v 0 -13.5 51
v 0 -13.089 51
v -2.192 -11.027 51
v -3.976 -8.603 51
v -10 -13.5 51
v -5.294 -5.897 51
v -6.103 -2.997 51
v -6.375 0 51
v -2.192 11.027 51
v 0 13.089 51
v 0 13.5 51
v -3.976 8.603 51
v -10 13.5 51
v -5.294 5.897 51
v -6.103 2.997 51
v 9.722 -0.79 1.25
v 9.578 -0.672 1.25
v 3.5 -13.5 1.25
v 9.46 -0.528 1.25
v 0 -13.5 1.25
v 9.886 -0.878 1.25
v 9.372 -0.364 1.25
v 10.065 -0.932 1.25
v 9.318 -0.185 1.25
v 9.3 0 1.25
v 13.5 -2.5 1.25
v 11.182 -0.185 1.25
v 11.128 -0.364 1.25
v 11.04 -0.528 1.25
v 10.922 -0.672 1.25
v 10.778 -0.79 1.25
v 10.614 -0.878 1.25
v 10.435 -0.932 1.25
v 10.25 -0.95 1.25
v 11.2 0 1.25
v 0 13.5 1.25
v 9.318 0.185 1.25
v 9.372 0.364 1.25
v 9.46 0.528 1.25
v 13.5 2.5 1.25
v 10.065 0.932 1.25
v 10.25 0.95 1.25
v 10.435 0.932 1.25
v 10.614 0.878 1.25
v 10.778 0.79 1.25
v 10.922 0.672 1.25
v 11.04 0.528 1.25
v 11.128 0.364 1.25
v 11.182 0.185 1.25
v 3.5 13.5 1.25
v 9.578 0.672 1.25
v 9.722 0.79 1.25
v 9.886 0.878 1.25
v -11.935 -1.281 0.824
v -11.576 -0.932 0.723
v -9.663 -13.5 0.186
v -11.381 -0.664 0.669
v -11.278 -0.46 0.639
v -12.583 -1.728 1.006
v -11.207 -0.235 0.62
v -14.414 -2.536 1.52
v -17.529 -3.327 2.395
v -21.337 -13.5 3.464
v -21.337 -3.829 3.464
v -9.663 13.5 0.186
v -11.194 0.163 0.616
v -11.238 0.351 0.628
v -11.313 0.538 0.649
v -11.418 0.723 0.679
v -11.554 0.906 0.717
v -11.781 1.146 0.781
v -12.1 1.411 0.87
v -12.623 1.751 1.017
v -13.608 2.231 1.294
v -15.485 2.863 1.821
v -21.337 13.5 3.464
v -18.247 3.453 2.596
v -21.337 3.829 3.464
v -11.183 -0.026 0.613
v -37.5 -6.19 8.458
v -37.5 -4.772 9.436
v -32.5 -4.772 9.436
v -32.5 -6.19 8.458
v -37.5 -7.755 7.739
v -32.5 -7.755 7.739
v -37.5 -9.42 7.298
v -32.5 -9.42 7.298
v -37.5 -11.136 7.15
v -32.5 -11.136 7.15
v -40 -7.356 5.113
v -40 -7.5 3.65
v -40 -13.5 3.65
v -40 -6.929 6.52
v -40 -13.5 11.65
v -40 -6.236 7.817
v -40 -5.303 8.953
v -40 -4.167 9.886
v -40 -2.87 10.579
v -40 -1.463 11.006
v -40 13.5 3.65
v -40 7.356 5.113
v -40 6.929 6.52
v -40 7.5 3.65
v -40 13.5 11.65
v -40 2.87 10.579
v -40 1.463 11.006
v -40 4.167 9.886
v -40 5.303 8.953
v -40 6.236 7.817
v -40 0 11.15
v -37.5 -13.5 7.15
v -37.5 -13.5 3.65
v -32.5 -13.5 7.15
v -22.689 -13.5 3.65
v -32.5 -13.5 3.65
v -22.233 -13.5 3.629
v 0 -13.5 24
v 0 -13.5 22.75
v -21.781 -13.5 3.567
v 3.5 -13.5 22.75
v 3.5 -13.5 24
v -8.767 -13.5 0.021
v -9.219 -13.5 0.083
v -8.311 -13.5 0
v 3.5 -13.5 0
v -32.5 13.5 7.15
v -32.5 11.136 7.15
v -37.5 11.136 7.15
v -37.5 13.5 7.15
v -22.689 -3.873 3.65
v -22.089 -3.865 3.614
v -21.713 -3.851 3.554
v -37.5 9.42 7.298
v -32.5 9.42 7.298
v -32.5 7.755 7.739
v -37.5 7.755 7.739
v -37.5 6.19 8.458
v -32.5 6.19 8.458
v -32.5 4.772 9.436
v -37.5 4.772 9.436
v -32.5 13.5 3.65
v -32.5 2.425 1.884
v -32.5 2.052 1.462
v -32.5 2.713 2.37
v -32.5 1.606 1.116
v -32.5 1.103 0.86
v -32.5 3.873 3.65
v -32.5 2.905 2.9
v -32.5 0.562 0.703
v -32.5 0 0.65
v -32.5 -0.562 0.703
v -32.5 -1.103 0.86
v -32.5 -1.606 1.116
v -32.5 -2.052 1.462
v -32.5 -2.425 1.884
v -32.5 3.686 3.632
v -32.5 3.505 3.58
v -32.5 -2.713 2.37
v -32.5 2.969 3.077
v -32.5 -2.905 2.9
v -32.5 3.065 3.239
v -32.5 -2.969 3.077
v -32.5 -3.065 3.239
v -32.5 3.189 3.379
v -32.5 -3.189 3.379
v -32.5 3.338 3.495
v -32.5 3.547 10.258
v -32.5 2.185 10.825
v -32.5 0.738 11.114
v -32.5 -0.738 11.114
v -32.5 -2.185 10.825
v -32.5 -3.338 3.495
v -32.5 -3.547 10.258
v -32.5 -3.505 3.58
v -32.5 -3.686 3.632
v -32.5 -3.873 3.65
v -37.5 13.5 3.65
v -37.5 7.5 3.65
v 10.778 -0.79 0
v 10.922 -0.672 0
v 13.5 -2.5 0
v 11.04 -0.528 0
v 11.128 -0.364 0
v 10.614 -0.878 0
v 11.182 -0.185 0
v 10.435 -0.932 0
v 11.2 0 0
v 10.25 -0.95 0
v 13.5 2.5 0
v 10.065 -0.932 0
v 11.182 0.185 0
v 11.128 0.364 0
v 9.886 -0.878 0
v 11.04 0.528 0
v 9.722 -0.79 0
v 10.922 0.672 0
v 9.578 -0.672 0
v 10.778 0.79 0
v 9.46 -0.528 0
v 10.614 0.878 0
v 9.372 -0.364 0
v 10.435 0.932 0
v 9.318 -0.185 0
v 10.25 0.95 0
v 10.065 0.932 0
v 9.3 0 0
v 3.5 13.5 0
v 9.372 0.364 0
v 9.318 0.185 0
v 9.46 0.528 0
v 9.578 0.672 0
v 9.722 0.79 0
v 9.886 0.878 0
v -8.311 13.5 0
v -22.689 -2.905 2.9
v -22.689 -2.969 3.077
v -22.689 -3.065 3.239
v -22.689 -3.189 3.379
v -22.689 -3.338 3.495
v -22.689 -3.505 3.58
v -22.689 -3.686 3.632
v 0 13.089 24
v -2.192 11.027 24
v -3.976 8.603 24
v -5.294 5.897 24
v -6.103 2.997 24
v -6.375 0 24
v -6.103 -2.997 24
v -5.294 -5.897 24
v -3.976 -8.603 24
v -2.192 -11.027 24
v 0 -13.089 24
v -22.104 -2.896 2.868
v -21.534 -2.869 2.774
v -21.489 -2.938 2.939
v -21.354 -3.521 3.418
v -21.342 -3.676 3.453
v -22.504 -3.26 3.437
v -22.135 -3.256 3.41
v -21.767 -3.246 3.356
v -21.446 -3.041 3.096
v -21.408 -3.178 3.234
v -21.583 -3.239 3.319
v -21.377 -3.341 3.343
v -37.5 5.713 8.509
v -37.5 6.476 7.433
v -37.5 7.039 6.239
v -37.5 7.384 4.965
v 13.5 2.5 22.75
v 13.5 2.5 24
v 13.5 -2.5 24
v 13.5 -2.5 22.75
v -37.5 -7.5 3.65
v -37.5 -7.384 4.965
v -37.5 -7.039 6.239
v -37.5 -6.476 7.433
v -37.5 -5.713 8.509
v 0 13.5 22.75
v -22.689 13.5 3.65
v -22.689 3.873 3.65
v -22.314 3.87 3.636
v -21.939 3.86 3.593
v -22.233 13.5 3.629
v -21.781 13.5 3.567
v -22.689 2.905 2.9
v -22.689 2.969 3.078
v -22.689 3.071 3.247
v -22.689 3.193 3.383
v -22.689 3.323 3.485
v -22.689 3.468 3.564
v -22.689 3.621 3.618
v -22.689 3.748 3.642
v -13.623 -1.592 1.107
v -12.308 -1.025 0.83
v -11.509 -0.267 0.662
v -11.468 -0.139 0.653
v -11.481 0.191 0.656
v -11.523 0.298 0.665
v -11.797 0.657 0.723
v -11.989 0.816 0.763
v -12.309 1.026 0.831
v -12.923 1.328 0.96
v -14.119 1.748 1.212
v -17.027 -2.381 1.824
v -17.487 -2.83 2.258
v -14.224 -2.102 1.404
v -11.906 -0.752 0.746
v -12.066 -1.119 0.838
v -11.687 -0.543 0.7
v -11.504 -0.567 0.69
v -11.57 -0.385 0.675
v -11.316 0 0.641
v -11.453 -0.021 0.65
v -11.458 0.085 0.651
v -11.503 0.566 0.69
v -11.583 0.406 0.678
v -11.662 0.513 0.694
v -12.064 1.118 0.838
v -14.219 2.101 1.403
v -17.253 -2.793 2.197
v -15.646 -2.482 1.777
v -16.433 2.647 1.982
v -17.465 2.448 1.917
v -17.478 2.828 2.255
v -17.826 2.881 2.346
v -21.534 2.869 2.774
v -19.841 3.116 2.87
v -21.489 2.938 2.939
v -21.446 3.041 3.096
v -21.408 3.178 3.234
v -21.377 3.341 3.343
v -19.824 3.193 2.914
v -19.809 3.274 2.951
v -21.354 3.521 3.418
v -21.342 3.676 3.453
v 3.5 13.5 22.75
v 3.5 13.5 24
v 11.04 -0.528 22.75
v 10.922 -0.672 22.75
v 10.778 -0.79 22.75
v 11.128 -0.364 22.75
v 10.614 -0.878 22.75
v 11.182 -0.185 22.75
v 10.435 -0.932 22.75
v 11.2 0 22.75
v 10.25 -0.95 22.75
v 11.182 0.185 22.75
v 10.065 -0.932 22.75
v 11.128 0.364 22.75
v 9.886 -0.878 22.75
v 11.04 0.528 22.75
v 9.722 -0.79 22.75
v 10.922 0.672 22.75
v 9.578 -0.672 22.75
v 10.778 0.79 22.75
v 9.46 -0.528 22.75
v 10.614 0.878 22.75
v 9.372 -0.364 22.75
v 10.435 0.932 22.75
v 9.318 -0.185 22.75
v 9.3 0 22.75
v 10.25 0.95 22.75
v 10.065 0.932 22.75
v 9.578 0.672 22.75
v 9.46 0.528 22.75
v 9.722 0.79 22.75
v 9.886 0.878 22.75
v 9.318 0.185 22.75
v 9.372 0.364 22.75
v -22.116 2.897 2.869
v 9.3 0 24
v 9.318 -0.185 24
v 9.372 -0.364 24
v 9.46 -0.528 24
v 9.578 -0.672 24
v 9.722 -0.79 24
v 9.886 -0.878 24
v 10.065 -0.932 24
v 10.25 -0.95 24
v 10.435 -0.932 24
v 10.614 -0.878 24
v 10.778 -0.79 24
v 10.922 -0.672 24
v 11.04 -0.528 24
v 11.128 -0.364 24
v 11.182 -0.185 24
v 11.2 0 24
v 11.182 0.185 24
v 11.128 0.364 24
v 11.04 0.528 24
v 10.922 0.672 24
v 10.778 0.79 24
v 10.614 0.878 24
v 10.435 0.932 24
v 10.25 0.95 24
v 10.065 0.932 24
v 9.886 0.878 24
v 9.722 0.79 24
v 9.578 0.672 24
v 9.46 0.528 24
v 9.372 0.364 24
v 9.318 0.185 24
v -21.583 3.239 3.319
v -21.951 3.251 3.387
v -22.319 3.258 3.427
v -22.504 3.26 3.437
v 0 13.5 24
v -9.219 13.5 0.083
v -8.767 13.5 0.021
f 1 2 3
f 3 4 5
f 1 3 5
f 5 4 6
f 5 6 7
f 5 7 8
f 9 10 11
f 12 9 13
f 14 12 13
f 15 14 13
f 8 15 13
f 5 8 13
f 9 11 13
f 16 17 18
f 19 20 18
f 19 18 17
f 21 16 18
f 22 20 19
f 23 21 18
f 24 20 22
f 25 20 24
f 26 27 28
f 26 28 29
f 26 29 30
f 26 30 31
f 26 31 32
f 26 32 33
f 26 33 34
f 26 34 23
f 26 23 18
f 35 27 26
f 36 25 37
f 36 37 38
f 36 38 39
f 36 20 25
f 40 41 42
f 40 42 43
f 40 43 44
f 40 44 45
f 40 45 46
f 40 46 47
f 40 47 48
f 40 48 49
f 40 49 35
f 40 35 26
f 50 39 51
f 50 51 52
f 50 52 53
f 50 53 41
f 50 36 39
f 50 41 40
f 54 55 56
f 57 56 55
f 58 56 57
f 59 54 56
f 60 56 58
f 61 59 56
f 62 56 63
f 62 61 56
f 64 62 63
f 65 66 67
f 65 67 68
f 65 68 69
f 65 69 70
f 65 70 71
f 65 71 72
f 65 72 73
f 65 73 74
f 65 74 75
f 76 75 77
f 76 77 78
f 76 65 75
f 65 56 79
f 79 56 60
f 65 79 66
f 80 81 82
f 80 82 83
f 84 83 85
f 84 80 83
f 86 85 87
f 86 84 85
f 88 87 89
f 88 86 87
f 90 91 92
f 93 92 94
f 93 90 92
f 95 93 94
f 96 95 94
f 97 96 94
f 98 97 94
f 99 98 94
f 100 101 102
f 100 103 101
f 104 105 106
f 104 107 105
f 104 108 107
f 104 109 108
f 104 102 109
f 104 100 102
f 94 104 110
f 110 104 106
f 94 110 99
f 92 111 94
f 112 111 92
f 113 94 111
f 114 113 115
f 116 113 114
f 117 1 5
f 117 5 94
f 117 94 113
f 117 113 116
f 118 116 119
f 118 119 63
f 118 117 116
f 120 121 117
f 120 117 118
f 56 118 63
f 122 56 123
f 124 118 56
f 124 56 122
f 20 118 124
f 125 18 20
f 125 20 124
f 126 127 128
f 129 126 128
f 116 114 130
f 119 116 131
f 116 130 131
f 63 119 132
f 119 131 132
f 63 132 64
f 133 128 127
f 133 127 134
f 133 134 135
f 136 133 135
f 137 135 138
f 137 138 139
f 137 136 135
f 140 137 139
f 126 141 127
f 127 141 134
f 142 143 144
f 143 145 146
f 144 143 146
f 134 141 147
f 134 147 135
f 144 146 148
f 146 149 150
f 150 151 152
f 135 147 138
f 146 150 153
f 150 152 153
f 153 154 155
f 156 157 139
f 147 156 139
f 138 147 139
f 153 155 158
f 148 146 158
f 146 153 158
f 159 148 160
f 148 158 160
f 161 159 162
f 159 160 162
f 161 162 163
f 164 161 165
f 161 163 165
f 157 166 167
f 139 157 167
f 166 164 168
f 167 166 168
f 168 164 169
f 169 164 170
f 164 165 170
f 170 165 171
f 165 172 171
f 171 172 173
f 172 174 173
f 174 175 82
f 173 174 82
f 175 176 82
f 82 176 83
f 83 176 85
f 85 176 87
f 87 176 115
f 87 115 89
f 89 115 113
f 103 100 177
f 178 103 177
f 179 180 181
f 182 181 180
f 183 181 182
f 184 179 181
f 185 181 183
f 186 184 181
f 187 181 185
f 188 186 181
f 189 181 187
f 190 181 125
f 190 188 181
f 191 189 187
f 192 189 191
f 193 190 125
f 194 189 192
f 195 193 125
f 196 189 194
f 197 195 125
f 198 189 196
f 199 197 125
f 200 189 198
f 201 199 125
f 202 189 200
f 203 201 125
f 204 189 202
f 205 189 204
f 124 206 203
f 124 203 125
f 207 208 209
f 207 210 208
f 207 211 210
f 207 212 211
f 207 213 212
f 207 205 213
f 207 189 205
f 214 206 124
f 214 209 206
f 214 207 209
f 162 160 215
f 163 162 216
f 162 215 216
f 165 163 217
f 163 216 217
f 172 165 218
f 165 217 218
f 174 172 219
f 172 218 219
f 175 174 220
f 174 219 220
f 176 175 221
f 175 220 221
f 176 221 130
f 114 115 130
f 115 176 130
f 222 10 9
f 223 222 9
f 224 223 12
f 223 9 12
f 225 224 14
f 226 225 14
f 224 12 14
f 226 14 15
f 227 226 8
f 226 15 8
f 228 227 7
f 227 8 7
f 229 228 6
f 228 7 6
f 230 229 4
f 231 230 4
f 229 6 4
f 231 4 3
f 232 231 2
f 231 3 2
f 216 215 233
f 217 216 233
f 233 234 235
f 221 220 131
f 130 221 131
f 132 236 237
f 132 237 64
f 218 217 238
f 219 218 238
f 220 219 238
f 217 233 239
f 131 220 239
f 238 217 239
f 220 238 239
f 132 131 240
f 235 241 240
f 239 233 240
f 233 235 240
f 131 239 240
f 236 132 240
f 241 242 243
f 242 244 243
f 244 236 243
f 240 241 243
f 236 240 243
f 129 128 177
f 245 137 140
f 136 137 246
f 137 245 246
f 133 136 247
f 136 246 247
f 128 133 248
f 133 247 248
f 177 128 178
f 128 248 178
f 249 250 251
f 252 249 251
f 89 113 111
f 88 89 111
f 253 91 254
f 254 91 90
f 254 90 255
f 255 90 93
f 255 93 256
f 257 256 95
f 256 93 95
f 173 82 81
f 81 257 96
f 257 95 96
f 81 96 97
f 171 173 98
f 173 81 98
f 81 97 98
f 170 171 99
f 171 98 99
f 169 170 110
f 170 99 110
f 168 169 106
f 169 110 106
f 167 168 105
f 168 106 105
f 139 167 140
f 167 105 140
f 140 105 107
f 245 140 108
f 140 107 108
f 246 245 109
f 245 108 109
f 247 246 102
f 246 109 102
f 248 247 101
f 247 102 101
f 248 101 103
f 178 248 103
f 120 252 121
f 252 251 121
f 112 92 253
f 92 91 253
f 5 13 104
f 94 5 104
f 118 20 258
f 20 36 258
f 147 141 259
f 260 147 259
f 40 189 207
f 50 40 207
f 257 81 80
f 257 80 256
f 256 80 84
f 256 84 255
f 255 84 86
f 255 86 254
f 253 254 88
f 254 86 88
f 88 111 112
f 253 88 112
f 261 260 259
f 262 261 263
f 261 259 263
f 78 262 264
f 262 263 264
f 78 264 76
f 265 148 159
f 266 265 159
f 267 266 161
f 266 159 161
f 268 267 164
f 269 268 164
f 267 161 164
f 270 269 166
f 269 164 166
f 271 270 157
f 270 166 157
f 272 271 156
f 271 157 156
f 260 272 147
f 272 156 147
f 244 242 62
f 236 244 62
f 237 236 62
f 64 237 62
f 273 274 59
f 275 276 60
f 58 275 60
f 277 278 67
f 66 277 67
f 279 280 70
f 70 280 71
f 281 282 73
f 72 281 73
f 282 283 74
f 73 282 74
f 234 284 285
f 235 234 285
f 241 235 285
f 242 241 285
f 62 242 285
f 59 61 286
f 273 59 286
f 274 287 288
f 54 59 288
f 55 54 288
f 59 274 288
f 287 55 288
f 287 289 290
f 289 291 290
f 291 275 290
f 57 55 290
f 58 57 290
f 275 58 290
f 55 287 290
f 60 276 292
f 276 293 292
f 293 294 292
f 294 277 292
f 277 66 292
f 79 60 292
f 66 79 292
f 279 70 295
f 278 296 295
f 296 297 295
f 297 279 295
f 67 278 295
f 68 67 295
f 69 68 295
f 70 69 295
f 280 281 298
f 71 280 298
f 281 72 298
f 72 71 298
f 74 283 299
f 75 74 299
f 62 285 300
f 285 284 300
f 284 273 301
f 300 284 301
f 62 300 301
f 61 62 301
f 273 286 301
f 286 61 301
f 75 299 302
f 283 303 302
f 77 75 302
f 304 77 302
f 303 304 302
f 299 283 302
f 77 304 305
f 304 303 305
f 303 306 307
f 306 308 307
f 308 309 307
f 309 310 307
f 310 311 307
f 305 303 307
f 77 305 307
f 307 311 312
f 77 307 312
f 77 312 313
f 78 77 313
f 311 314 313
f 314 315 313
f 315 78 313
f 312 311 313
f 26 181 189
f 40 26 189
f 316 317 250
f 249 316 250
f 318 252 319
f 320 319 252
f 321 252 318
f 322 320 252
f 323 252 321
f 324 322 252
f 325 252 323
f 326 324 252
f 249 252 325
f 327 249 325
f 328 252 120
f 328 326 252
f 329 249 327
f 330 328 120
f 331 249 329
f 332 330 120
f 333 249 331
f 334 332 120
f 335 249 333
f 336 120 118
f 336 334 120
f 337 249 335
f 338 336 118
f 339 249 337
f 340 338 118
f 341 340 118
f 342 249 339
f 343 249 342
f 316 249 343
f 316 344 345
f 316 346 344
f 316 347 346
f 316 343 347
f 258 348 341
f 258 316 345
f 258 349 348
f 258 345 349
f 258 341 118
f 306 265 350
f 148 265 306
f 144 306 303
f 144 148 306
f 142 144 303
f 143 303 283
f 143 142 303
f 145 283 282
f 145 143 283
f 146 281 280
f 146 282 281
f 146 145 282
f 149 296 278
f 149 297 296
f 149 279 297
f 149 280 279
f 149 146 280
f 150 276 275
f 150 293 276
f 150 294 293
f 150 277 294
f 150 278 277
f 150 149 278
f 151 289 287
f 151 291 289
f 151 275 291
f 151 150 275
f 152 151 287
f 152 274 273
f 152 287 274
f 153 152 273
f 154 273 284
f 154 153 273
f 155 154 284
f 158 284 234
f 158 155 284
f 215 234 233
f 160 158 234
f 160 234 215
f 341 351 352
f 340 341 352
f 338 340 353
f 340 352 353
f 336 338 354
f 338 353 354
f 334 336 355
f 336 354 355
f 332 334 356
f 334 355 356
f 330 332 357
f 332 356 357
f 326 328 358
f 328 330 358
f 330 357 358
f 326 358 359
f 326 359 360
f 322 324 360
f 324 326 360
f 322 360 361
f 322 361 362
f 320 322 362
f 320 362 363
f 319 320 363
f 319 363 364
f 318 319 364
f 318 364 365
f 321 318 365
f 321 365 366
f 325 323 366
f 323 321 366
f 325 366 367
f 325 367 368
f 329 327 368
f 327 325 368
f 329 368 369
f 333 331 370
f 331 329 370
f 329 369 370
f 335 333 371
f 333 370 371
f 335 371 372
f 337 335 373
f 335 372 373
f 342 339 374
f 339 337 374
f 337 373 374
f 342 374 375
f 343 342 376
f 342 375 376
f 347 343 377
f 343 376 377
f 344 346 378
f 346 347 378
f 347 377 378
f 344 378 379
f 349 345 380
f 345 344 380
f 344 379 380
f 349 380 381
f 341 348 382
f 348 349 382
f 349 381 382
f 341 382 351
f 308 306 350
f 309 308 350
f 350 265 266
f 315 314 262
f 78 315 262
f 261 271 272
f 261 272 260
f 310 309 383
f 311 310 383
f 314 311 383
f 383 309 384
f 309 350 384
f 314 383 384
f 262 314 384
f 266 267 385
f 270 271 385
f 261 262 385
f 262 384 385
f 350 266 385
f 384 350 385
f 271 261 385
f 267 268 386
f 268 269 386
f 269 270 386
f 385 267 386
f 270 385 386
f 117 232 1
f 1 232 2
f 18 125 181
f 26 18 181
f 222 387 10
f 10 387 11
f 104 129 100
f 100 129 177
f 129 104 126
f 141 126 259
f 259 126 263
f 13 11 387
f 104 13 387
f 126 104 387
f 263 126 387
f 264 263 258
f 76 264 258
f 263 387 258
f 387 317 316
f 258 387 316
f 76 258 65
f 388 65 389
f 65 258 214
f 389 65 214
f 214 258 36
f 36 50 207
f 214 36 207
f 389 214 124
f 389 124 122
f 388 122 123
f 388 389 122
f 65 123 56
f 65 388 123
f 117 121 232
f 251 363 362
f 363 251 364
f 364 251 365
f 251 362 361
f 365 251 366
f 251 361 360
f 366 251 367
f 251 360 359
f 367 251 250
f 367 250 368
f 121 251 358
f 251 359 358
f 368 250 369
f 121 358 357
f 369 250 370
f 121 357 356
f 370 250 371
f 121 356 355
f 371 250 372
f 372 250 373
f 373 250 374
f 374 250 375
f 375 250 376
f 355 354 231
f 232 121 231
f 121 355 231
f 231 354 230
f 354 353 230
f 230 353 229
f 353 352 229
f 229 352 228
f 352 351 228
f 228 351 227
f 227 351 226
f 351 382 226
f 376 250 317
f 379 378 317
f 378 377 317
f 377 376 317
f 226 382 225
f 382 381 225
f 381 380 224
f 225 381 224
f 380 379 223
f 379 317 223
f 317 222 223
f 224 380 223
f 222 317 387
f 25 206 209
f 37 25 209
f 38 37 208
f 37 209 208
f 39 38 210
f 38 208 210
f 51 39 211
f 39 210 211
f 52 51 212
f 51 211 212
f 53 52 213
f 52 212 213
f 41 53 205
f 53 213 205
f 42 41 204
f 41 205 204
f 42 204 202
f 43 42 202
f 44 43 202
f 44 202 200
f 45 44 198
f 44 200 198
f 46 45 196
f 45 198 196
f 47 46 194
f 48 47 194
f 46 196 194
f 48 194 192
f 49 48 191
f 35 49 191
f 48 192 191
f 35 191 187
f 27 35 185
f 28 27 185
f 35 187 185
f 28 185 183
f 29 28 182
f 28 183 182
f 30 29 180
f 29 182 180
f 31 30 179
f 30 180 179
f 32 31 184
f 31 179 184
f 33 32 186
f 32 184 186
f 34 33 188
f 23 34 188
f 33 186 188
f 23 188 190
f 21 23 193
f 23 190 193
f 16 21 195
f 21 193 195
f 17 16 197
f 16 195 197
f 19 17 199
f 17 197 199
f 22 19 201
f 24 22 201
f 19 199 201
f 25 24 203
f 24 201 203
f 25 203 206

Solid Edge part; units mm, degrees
sketch "Sketch1" plane through (0, 0, 0) normal (0, -1, 0) x (1, 0, 0)
  line L0 (0, 0) -> (0, 51)
  line L1 (0, 51) -> (-10, 51)
  line L2 (-10, 51) -> (-40, 11.65)
  line L3 (-40, 3.65) -> (-40, 11.65)
  line L4 (-40, 3.65) -> (-22, 3.65)
  line L5 (-9, 0) -> (-22, 3.65)
  line L6 (0, 0) -> (-9, 0)
extrude "Protrusion1" add sketch "Sketch1" along normal mid plane 27
sketch "Sketch2" plane through (-5, 0, 51) normal (0, 0, 1) x (0, -1, 0)
  circle A0 centre (0, 15.25) radius 16.625
extrude "ExtrudedCutout_1" cut sketch "Sketch2" against normal blind 27
sketch "Sketch3" plane through (-20, -13.5, 25.5) normal (0, -1, 0) x (1, 0, 0)
  line L0 (-17.5, -21.85) -> (-12.5, -21.85)
  line L1 (-12.5, -21.85) -> (-12.5, -18.35)
  line L2 (-12.5, -18.35) -> (-17.5, -18.35)
  line L3 (-17.5, -18.35) -> (-17.5, -21.85)
extrude "Cutout1" cut sketch "Sketch3" against normal through all
sketch "Sketch4" plane through (-40, 0, 7.65) normal (-1, 0, 0) x (0, -1, 0)
  arc A0 (7.5, -4) -> (-7.5, -4) centre (0, -4) ccw
extrude "Cutout2" cut sketch "Sketch4" against normal up to surface (7.5 mm away) material side at (-40, 0, 11.1)
fillet "Round_1" radius 10 2 edges at (-35, -6.6332, 7.15) (-35, 6.6332, 7.15)
sketch "Sketch5" plane through (0, 0, 0) normal (0, 0, -1) x (-1, 0, 0)
  line L0 (0, 13.5) -> (0, -13.5)
  line L1 (0, -13.5) -> (-3.5, -13.5)
  line L2 (-3.5, -13.5) -> (-13.5, -2.5)
  line L3 (-13.5, -2.5) -> (-13.5, 2.5)
  line L4 (-13.5, 2.5) -> (-3.5, 13.5)
  line L5 (0, 13.5) -> (-3.5, 13.5)
  circle A0 centre (-10.25, 0) radius 0.95
extrude "ExtrudedProtrusion_2" add sketch "Sketch5" against normal blind 1.25
mirror "Mirror1" about plane through (2.25, 0, 12) normal (0, 0, -1) of "ExtrudedProtrusion_2"
fillet "Round_2" radius 5 2 edges at (-22, 0, 3.65) (-9, 0, 0)
sketch "Sketch6" plane through (-32.5, 0, 7.4) normal (-1, 0, 0) x (0, -1, 0)
  circle A0 centre (0, -3.75) radius 3
extrude "Protrusion3" add sketch "Sketch6" against normal up to vertex (22.837 mm away)
fillet "Round_3" radius 1 5 edges at (-27.5943, -3, 3.65) (-22.0064, -2.9996, 3.6032) (-11.3151, 0, 0.65) (-22.0064, 2.9996, 3.6032) (-27.5943, 3, 3.65)
properties material "Stainless Steel, 420"
